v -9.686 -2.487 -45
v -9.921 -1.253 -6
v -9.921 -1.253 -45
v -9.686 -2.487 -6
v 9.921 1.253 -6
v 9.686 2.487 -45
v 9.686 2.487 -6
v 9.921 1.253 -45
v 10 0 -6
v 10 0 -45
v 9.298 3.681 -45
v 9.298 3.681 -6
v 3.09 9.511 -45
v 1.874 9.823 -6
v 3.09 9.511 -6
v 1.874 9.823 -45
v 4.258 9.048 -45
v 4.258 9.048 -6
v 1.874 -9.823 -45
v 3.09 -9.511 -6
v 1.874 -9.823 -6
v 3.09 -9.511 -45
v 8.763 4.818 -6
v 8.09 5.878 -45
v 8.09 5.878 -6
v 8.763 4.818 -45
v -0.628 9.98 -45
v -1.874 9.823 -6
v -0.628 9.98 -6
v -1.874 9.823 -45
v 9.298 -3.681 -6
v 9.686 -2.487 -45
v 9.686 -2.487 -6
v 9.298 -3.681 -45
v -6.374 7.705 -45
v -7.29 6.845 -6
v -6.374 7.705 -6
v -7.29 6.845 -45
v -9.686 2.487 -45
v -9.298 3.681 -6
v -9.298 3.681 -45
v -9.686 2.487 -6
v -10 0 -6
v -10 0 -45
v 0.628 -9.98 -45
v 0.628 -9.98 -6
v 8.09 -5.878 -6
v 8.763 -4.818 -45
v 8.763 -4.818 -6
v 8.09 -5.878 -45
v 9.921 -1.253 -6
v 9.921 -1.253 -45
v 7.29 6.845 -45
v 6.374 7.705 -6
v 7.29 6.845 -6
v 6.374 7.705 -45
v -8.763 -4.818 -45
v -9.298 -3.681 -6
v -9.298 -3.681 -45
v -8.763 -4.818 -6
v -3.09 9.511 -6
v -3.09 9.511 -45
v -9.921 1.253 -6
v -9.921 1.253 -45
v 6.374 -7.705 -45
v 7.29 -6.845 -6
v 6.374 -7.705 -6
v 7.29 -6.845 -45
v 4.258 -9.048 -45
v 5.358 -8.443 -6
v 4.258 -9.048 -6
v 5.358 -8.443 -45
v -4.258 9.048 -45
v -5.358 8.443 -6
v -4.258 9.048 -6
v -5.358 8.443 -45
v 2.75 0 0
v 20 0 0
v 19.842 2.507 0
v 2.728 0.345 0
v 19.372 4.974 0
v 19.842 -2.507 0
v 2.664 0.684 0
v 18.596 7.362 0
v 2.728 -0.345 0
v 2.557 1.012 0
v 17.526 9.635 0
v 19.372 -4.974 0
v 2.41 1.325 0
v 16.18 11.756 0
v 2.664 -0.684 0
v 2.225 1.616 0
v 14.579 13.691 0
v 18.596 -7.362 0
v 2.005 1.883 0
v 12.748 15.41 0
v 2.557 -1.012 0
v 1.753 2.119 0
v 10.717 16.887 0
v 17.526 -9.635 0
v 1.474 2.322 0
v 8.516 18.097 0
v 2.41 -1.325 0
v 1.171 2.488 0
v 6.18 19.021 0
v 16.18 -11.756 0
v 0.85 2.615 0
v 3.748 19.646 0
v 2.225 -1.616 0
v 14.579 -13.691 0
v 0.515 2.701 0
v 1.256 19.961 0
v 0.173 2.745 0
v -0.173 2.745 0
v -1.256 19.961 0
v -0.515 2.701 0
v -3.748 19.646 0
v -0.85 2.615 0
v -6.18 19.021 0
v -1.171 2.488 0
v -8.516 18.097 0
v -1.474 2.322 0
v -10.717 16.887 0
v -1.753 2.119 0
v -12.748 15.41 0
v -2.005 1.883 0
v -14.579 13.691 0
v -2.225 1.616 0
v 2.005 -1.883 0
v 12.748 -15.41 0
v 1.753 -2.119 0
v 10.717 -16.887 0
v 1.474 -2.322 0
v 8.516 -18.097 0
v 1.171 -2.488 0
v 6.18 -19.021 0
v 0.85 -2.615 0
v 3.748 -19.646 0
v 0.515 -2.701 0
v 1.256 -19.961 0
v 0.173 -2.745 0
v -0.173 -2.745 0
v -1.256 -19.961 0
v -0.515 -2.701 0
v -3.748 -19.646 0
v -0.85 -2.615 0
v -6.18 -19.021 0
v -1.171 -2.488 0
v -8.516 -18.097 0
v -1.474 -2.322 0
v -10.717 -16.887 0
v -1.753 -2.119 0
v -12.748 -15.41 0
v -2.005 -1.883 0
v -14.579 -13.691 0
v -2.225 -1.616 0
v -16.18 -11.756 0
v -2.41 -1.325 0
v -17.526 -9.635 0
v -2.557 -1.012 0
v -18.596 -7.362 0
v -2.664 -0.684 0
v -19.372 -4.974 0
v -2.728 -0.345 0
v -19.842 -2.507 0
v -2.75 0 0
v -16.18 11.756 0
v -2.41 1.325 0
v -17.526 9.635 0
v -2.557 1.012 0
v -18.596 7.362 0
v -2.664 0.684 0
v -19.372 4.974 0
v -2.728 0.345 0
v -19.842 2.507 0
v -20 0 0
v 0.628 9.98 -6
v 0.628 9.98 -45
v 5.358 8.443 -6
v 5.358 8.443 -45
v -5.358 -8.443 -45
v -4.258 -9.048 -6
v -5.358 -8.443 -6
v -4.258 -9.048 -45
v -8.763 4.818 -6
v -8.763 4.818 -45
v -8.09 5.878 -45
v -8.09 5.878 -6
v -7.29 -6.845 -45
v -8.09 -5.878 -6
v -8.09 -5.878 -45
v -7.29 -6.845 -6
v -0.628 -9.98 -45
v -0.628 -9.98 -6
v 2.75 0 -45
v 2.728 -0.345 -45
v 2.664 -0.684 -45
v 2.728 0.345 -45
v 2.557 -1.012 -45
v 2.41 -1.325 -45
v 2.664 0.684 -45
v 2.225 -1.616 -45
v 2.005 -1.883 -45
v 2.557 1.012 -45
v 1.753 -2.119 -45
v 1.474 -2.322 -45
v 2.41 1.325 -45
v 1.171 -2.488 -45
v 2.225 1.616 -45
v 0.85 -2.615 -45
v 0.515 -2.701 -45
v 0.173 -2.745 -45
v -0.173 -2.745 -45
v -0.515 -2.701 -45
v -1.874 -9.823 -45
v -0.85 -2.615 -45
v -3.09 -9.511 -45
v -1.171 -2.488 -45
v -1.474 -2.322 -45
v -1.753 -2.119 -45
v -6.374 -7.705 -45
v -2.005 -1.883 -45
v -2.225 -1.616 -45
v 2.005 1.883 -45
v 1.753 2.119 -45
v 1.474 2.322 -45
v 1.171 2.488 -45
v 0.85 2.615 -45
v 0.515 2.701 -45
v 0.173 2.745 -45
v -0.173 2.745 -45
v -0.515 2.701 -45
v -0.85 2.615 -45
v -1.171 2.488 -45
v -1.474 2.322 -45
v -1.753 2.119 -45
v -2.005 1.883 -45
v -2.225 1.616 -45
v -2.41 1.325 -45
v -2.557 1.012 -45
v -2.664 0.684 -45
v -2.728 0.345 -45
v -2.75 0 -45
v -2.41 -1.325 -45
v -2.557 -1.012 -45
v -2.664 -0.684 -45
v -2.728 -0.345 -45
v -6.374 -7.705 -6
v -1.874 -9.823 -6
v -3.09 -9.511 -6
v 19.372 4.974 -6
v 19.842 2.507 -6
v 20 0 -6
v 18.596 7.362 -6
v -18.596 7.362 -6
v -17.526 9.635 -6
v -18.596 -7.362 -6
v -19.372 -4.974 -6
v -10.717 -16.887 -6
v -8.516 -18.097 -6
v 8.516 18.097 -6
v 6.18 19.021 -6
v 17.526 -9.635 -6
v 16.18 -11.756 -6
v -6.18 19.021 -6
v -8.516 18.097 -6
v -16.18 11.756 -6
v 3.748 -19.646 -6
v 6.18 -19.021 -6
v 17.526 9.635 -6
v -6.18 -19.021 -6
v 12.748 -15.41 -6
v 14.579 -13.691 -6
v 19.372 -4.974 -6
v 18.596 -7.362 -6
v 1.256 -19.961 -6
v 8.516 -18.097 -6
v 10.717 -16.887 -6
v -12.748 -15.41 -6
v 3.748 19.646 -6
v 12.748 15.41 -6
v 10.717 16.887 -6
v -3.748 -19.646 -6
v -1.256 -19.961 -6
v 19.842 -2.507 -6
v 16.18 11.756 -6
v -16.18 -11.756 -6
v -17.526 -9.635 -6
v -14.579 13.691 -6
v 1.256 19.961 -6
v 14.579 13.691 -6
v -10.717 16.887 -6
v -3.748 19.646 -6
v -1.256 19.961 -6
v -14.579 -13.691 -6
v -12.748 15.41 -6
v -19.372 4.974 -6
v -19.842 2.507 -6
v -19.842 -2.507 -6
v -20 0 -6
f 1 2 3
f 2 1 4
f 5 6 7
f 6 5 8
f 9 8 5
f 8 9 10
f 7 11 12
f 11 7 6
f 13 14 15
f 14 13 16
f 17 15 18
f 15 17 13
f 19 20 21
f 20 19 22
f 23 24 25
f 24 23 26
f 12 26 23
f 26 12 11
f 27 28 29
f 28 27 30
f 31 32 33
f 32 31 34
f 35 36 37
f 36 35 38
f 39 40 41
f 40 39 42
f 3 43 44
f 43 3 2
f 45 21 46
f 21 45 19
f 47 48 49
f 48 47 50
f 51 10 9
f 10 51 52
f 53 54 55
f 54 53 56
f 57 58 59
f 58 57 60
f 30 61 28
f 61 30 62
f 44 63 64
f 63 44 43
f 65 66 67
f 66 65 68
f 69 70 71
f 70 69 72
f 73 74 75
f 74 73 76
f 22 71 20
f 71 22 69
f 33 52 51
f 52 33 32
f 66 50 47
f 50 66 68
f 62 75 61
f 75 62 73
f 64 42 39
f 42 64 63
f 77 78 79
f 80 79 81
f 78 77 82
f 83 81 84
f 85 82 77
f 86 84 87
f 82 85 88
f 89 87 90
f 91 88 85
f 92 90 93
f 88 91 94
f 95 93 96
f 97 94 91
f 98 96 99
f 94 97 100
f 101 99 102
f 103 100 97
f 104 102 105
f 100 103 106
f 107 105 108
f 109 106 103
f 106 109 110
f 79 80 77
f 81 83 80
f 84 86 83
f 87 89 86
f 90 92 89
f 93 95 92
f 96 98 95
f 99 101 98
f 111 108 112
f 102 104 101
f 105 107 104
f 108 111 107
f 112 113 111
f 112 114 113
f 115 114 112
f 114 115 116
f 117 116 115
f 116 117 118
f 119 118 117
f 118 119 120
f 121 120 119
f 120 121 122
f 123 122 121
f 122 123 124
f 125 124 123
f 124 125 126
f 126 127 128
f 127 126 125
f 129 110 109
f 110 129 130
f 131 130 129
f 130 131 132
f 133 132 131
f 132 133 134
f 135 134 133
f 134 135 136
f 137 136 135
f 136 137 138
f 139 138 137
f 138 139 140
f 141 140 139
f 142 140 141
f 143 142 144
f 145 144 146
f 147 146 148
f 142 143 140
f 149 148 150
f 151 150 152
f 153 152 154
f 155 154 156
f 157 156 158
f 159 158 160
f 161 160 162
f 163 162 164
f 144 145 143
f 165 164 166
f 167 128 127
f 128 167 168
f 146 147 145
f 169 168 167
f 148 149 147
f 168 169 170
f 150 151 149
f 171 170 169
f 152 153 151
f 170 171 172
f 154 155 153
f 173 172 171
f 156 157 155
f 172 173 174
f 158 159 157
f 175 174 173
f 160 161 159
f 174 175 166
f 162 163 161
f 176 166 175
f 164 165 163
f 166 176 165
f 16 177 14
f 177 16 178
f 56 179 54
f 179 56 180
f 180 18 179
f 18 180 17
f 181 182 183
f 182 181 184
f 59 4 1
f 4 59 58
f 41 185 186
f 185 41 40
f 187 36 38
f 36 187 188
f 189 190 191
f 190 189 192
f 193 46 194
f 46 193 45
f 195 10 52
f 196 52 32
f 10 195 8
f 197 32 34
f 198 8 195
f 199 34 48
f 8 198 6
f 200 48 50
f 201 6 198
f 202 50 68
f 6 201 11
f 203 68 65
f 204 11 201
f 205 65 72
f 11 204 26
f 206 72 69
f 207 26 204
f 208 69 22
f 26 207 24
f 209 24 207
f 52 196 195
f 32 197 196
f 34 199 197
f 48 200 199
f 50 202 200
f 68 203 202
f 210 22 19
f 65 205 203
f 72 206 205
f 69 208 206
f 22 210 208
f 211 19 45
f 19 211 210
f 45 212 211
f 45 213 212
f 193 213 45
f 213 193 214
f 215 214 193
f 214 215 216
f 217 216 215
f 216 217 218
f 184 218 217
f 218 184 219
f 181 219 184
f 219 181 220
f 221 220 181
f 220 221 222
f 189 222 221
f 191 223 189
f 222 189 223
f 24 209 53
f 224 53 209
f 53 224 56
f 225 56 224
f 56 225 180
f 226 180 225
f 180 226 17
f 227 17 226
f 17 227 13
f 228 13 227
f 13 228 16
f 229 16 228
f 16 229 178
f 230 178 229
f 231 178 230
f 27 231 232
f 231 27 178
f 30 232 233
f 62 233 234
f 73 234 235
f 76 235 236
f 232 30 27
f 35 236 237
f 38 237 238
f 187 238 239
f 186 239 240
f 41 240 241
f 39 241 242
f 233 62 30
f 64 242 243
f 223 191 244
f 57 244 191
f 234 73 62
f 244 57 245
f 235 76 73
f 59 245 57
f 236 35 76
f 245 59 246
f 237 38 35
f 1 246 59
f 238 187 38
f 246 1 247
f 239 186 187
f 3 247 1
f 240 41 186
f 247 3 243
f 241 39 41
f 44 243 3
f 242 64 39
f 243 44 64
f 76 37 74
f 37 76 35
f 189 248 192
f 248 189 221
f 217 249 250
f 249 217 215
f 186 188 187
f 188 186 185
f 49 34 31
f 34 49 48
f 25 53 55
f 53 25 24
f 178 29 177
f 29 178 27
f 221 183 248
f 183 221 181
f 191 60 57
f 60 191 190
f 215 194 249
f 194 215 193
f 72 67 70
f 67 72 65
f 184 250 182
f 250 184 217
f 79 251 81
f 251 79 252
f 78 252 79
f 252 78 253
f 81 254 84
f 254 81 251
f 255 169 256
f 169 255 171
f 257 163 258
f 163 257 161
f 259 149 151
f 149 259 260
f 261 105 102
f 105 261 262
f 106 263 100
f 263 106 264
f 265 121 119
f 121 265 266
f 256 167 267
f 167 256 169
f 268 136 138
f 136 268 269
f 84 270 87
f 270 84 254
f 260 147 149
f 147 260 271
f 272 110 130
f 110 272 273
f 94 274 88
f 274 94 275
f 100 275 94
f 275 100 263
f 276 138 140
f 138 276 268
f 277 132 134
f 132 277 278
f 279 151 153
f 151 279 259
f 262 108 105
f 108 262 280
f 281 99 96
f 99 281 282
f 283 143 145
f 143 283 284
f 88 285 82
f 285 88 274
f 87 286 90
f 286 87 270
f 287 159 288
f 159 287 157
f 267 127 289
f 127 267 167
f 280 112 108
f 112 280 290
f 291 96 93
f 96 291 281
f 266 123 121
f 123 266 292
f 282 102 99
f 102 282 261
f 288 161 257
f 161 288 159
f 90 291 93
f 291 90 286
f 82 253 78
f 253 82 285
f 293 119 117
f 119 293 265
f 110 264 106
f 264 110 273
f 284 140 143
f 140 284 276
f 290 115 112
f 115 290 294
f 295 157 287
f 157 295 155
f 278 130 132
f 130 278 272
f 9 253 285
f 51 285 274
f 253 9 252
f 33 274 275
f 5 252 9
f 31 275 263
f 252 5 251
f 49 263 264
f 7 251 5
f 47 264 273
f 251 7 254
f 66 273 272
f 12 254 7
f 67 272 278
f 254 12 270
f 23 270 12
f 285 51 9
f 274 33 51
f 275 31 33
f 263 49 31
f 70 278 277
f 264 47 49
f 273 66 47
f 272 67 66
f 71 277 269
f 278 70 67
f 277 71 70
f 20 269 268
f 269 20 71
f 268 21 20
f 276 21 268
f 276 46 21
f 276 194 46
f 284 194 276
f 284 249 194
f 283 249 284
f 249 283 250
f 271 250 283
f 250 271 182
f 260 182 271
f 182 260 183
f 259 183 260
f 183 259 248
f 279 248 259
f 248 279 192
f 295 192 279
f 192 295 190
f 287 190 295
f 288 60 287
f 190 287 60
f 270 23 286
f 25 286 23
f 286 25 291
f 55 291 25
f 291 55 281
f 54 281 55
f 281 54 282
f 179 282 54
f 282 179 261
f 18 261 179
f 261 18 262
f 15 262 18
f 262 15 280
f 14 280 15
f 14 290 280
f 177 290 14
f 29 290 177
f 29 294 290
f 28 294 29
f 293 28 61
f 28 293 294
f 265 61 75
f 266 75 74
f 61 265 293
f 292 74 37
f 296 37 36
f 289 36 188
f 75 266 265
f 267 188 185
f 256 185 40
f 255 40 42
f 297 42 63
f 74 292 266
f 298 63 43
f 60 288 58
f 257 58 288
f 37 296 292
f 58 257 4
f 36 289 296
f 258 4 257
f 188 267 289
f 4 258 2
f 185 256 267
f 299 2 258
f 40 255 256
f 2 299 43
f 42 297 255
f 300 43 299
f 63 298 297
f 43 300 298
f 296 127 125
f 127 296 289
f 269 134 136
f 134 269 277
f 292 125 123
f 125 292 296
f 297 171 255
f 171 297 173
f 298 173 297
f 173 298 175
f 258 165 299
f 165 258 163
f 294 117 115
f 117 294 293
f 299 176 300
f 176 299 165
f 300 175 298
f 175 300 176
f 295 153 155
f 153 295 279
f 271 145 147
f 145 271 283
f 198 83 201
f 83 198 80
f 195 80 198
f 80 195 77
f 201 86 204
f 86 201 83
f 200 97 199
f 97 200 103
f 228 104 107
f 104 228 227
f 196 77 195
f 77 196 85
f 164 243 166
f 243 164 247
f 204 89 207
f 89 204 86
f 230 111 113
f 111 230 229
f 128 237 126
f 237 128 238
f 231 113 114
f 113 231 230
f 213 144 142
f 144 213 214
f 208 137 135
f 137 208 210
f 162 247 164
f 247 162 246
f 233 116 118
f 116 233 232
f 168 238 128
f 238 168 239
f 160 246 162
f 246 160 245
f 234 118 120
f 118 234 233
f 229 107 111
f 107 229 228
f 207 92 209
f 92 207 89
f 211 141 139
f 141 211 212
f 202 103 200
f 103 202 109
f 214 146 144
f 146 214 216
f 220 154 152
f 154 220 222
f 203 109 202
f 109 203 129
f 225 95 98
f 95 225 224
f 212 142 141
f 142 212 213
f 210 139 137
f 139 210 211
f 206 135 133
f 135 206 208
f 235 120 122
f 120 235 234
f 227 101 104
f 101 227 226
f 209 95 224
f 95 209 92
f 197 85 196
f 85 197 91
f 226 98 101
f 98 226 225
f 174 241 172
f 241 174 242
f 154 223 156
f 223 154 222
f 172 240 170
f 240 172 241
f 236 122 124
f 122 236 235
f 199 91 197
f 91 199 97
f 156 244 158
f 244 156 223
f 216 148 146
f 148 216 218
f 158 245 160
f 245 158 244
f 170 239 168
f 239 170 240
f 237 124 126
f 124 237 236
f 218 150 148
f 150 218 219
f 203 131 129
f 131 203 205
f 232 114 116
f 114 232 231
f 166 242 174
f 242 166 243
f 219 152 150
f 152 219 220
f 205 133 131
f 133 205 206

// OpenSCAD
$fn = 50;


difference() {
	union() {
		translate(v = [0, 0, -45.0000000000]) {
			cylinder(h = 45, r = 10.0000000000);
		}
		translate(v = [0, 0, -6.0000000000]) {
			cylinder(h = 6, r = 20.0000000000);
		}
	}
	union() {
		#translate(v = [0, 0, -45]) {
			cylinder(h = 45, r = 2.7500000000);
		}
	}
}
